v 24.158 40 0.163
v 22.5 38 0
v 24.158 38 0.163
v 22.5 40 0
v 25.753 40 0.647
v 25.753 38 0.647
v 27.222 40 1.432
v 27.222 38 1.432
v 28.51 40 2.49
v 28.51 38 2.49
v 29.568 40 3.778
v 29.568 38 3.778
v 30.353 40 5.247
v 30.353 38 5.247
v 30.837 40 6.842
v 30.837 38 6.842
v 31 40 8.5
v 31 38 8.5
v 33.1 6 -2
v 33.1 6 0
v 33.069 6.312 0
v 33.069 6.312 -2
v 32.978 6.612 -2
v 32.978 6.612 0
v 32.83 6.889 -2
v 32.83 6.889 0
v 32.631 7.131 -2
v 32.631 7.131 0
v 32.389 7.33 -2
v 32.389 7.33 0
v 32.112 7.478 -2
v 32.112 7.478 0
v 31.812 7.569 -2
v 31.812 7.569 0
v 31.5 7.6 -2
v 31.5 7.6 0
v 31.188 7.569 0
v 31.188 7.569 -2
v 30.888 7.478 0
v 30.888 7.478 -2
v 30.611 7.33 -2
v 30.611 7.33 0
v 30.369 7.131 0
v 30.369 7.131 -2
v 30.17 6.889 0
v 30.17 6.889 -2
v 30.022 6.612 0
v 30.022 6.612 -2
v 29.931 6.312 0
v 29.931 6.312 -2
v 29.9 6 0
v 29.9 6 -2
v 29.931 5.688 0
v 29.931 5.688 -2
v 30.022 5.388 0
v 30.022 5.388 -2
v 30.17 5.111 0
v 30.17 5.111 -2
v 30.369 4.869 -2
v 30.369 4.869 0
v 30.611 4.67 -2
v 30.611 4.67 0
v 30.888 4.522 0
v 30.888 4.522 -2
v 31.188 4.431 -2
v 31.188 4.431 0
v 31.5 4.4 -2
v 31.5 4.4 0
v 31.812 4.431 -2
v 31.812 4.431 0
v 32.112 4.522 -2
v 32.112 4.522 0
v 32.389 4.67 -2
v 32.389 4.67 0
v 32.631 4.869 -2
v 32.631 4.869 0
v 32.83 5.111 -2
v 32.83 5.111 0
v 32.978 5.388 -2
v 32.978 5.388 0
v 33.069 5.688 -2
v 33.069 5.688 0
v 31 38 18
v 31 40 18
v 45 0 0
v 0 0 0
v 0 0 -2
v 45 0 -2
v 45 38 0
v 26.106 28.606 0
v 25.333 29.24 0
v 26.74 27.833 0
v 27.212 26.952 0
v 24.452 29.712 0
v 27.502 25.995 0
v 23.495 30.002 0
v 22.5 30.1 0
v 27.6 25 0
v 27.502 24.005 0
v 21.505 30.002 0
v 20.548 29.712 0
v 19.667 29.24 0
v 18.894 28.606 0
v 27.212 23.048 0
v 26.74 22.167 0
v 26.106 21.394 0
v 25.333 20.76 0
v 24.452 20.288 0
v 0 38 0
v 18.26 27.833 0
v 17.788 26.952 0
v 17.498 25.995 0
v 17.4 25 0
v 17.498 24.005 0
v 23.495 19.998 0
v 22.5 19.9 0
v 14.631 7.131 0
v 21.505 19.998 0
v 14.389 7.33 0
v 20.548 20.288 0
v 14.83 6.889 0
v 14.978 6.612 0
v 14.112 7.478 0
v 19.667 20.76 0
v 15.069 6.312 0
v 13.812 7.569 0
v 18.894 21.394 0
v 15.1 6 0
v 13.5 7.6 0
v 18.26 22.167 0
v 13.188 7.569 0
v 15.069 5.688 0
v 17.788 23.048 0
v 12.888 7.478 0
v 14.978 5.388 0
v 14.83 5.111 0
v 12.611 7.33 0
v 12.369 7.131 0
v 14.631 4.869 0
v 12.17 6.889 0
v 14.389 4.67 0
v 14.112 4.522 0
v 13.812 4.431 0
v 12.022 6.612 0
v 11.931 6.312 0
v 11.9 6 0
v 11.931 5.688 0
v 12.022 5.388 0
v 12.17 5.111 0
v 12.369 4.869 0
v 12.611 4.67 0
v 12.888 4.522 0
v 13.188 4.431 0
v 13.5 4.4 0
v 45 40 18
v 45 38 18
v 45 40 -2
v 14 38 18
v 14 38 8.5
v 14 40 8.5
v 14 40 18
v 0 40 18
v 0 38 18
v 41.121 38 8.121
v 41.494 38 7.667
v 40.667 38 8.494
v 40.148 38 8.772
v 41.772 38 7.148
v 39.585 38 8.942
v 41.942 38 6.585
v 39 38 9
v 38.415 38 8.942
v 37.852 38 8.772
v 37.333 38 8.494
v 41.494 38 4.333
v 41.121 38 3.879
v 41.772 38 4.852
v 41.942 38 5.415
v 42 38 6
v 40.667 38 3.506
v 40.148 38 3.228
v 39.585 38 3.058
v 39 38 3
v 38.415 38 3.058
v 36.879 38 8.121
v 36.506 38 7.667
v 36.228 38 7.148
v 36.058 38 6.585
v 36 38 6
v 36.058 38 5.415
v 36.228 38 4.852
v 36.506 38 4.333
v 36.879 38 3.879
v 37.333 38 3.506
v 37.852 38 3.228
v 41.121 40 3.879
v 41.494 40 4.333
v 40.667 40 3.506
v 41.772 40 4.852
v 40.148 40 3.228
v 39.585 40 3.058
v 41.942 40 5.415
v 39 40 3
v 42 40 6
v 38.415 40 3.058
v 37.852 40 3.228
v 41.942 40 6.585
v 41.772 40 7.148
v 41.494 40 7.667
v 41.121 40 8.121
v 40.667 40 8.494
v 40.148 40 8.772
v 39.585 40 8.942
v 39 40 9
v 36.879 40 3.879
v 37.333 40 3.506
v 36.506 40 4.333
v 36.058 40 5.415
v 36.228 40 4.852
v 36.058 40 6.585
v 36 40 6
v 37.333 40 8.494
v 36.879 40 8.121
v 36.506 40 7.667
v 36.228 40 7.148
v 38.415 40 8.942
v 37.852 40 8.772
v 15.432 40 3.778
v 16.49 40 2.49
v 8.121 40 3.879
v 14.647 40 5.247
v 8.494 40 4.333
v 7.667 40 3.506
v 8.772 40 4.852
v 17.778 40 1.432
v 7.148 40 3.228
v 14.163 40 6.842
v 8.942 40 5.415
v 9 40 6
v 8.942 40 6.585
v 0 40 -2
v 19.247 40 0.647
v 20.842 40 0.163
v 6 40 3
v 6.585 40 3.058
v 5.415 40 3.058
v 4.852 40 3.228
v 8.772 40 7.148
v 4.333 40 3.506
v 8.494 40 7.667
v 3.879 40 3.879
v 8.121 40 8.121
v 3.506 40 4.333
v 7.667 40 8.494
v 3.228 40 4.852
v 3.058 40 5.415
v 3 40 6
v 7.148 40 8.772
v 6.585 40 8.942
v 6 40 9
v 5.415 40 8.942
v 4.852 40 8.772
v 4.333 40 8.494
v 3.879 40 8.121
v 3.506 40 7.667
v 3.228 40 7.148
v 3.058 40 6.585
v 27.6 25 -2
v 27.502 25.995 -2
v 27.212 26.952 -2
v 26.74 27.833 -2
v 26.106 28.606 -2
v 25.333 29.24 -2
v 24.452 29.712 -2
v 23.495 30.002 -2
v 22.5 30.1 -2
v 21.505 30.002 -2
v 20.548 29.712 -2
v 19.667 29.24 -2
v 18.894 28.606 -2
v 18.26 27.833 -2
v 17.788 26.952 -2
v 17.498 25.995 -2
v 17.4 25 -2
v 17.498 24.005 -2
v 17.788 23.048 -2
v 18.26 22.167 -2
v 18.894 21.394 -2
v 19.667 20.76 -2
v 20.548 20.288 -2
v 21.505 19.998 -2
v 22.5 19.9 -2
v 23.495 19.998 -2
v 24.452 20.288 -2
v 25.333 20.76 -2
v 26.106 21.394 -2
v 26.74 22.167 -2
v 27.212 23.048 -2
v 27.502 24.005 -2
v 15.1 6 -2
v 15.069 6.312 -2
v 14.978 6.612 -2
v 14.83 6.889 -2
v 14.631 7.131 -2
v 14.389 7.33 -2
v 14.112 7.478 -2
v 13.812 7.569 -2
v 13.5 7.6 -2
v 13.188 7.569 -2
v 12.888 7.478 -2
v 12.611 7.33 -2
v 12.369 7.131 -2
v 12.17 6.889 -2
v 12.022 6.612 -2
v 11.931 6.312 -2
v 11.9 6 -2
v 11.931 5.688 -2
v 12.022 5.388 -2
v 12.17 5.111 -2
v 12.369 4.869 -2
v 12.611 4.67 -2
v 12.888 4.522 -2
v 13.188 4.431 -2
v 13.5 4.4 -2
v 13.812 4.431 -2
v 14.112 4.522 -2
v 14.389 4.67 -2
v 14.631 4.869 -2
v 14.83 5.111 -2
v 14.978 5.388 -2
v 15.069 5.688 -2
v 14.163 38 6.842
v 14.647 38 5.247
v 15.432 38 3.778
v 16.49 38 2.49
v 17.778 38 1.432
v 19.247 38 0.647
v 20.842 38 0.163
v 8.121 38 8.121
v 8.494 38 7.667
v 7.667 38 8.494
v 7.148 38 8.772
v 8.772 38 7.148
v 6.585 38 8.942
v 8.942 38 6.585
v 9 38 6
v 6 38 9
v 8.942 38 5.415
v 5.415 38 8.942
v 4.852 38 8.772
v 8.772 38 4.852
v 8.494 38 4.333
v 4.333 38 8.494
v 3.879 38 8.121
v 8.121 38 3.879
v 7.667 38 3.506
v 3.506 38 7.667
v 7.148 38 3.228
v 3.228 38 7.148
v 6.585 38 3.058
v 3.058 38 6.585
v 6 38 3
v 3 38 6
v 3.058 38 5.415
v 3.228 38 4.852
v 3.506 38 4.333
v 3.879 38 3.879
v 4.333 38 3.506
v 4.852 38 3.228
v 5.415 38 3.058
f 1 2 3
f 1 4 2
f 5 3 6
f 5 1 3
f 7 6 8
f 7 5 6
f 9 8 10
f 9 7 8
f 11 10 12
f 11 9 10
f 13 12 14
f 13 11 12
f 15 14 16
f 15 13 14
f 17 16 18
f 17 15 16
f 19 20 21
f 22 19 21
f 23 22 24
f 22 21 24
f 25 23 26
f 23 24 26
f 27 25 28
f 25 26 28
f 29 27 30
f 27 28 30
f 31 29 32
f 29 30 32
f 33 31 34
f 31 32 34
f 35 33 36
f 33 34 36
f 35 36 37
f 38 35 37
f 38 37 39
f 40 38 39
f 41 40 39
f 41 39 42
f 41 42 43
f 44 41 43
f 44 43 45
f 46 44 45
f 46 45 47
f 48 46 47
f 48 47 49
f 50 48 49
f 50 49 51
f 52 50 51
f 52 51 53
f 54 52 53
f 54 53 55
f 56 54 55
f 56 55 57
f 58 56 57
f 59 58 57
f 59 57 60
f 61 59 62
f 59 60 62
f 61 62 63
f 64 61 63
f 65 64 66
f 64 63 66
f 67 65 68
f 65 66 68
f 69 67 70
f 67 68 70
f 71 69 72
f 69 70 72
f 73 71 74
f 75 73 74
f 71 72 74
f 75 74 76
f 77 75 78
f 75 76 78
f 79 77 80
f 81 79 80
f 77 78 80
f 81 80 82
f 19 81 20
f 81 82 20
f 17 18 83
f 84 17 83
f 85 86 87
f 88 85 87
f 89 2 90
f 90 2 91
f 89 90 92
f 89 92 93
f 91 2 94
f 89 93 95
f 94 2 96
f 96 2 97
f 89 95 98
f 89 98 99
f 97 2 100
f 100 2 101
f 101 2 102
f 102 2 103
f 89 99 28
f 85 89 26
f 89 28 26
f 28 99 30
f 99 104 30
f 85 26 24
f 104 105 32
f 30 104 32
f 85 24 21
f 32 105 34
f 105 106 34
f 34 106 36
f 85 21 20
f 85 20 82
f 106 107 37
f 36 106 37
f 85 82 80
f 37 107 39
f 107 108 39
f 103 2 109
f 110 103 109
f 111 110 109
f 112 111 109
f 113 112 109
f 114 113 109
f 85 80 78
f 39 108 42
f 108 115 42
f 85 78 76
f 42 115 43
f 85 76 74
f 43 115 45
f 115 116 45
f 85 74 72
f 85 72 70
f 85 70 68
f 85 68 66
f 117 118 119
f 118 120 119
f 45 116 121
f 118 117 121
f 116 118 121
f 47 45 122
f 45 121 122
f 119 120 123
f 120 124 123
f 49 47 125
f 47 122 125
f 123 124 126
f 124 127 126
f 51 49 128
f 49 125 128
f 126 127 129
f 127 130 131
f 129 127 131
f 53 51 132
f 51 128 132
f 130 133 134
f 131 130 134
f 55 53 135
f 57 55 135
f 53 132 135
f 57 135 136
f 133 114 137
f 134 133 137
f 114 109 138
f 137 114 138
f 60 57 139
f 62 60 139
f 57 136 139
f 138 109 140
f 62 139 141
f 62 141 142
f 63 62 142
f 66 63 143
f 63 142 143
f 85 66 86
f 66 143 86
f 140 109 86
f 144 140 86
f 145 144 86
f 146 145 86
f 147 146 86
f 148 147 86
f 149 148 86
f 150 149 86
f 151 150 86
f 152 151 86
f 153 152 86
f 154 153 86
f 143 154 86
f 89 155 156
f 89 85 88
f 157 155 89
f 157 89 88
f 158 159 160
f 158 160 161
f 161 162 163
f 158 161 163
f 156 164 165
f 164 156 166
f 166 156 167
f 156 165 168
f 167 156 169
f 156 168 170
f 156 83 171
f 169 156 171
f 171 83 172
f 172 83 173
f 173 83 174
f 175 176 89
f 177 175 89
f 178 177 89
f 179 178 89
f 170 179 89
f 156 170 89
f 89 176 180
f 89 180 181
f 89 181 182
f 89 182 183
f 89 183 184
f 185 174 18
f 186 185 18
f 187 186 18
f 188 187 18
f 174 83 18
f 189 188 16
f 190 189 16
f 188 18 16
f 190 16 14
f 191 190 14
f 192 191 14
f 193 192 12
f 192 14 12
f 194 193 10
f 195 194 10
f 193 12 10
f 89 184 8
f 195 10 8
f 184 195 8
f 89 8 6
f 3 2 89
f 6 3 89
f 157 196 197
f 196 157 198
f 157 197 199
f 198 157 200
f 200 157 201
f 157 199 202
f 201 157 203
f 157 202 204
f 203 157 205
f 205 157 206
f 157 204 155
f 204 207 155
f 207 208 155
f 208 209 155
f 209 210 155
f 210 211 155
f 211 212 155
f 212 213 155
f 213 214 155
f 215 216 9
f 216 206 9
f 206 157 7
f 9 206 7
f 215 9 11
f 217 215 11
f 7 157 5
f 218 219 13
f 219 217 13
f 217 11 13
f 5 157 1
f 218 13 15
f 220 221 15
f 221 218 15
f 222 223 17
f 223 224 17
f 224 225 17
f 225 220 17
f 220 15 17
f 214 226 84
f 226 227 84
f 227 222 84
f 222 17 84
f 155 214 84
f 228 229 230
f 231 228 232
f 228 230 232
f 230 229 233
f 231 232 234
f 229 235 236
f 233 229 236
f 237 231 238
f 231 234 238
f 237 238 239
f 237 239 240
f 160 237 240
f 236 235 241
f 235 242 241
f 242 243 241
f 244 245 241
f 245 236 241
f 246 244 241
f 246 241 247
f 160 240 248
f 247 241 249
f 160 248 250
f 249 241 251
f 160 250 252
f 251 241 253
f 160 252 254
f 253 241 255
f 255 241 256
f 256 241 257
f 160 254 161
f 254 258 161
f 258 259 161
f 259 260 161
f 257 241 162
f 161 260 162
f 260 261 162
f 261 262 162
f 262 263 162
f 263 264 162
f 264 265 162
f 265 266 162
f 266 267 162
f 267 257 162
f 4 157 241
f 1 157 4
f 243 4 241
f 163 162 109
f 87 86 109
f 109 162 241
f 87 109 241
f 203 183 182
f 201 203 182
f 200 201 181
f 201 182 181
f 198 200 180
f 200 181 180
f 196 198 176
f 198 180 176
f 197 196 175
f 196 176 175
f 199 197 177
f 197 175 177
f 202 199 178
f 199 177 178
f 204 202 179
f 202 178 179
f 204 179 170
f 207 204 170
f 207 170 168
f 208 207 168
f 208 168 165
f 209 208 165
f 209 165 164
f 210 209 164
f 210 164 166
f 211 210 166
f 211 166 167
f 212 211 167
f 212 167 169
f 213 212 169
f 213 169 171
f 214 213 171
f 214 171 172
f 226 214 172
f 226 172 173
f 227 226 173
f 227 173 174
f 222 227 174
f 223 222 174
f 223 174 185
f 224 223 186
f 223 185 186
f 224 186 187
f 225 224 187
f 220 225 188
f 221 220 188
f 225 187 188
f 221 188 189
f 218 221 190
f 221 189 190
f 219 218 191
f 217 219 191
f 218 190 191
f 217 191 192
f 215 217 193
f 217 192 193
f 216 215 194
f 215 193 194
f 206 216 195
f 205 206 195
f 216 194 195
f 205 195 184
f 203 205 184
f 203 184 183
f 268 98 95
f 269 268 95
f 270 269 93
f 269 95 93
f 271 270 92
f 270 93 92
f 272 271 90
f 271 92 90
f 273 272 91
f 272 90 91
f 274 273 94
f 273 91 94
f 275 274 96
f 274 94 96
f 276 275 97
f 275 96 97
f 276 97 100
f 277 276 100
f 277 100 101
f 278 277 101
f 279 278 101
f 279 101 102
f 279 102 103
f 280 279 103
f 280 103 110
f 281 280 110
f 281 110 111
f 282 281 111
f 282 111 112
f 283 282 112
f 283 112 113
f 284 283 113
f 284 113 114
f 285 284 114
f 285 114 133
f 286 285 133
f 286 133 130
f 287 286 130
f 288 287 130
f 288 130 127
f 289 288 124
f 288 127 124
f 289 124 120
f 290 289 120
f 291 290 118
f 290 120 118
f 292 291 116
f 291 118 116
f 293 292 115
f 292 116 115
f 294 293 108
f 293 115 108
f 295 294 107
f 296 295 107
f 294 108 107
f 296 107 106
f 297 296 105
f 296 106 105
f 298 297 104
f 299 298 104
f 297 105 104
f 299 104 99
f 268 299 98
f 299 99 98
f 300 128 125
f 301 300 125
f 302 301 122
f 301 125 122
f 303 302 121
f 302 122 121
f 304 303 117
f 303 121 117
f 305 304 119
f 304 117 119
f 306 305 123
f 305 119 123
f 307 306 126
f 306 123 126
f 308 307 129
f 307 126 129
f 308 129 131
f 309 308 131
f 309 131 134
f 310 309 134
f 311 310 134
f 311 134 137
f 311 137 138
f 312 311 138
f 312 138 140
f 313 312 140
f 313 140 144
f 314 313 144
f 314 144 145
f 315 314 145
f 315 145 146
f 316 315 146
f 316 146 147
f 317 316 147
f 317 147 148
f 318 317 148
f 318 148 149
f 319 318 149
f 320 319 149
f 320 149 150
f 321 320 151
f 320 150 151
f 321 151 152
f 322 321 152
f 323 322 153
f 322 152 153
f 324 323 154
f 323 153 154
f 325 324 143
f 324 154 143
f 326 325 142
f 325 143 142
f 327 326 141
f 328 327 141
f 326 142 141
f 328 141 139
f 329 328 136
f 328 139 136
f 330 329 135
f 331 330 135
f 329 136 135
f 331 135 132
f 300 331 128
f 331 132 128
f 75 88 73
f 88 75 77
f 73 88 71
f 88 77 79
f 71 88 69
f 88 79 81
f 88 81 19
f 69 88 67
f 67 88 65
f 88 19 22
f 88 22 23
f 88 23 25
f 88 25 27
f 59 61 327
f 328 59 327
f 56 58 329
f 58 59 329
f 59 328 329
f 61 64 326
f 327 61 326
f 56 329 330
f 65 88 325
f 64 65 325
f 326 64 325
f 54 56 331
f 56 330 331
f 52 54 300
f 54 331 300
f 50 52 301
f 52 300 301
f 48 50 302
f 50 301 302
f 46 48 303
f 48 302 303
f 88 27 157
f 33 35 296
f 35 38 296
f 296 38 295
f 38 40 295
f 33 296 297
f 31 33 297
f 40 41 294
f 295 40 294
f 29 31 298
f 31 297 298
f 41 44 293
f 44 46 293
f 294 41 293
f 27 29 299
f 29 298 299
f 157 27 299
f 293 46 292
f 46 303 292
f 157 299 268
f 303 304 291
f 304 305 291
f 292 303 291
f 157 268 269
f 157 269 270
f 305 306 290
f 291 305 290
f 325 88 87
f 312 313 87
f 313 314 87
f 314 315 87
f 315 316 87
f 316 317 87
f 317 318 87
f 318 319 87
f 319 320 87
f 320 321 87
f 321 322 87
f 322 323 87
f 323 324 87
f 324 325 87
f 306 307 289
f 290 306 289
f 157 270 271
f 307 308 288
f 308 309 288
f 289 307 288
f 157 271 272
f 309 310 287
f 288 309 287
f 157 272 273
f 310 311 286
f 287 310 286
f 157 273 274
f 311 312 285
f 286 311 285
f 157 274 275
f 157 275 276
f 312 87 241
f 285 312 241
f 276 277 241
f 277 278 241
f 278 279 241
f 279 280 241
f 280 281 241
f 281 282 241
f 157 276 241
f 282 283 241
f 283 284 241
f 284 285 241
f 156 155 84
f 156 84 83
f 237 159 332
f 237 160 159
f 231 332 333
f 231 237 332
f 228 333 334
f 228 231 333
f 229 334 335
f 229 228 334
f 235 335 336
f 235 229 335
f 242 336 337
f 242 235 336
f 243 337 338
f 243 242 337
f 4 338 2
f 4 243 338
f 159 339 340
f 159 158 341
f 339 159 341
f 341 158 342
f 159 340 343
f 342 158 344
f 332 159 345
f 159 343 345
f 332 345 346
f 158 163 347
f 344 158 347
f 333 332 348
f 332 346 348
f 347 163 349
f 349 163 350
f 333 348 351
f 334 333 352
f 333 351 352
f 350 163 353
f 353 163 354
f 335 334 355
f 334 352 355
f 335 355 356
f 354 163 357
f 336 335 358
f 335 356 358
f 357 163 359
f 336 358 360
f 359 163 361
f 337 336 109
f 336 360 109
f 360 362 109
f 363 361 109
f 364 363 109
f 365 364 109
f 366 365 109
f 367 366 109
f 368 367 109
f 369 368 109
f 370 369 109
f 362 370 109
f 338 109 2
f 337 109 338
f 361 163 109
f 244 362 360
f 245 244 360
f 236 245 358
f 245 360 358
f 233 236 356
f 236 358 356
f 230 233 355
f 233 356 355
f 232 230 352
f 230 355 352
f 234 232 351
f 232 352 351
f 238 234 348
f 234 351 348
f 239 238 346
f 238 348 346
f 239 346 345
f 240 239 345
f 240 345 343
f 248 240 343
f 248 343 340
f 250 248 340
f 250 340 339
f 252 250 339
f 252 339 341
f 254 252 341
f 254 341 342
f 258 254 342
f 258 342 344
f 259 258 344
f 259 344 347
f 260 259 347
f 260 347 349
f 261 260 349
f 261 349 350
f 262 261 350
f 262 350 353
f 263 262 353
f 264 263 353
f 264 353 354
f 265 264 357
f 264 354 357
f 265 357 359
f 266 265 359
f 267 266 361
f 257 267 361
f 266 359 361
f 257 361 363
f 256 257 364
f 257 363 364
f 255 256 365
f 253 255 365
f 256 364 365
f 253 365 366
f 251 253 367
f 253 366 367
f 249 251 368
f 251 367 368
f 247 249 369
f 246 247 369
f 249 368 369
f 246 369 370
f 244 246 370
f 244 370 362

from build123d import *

# Parameters (mm, degrees)
EXTRUDE_1_DEPTH     = 45
SKETCH_2_R          = 5.1
SKETCH_2_R_2        = 1.6
CUT_EXTRUDE_1_DEPTH = 63.841069373
SKETCH_3_R          = 3
SKETCH_3_W          = 17
SKETCH_3_H          = 18
CUT_EXTRUDE_2_DEPTH = 62.587336361
FILLET_1_R          = 8.5


with BuildPart() as part:
    # ｽｹｯﾁ1 → ﾎﾞｽ - 押し出し1 (new body)
    with BuildSketch(Plane(origin=(0, 0, 0), x_dir=(0, 0, -1), z_dir=(1, 0, 0))):
        Polygon((-18, 40), (-18, 38), (0, 38), (0, 0), (2, 0), (2, 40), align=None)
    extrude(amount=EXTRUDE_1_DEPTH)

    # ｽｹｯﾁ2 → ｶｯﾄ - 押し出し1 (cut, through all)
    with BuildSketch(Plane.XY):
        with Locations((22.5, 25)):
            Circle(SKETCH_2_R)
        with Locations((13.5, 6)):
            Circle(SKETCH_2_R_2)
        with Locations((31.5, 6)):
            Circle(SKETCH_2_R_2)
    extrude(amount=-CUT_EXTRUDE_1_DEPTH, mode=Mode.SUBTRACT)

    # ｽｹｯﾁ3 → ｶｯﾄ - 押し出し2 (cut, through all)
    with BuildSketch(Plane.XZ.offset(-38)):
        with Locations(Location((6, 6, 0), (0, 0, 270))):
            Circle(SKETCH_3_R)
        with Locations(Location((39, 6, 0), (0, 0, 270))):
            Circle(SKETCH_3_R)
        with Locations((22.5, 9)):
            Rectangle(SKETCH_3_W, SKETCH_3_H)
    extrude(amount=-CUT_EXTRUDE_2_DEPTH, mode=Mode.SUBTRACT)

    # ﾌｨﾚｯﾄ1
    fillet_1_edges = [part.edges().sort_by_distance(p)[0] for p in [
        (31, 39, 0),
        (14, 39, 0),
    ]]
    fillet(fillet_1_edges, radius=FILLET_1_R - 0.0001)  # a hair under: the kernel refuses the full size


solid = part.part
